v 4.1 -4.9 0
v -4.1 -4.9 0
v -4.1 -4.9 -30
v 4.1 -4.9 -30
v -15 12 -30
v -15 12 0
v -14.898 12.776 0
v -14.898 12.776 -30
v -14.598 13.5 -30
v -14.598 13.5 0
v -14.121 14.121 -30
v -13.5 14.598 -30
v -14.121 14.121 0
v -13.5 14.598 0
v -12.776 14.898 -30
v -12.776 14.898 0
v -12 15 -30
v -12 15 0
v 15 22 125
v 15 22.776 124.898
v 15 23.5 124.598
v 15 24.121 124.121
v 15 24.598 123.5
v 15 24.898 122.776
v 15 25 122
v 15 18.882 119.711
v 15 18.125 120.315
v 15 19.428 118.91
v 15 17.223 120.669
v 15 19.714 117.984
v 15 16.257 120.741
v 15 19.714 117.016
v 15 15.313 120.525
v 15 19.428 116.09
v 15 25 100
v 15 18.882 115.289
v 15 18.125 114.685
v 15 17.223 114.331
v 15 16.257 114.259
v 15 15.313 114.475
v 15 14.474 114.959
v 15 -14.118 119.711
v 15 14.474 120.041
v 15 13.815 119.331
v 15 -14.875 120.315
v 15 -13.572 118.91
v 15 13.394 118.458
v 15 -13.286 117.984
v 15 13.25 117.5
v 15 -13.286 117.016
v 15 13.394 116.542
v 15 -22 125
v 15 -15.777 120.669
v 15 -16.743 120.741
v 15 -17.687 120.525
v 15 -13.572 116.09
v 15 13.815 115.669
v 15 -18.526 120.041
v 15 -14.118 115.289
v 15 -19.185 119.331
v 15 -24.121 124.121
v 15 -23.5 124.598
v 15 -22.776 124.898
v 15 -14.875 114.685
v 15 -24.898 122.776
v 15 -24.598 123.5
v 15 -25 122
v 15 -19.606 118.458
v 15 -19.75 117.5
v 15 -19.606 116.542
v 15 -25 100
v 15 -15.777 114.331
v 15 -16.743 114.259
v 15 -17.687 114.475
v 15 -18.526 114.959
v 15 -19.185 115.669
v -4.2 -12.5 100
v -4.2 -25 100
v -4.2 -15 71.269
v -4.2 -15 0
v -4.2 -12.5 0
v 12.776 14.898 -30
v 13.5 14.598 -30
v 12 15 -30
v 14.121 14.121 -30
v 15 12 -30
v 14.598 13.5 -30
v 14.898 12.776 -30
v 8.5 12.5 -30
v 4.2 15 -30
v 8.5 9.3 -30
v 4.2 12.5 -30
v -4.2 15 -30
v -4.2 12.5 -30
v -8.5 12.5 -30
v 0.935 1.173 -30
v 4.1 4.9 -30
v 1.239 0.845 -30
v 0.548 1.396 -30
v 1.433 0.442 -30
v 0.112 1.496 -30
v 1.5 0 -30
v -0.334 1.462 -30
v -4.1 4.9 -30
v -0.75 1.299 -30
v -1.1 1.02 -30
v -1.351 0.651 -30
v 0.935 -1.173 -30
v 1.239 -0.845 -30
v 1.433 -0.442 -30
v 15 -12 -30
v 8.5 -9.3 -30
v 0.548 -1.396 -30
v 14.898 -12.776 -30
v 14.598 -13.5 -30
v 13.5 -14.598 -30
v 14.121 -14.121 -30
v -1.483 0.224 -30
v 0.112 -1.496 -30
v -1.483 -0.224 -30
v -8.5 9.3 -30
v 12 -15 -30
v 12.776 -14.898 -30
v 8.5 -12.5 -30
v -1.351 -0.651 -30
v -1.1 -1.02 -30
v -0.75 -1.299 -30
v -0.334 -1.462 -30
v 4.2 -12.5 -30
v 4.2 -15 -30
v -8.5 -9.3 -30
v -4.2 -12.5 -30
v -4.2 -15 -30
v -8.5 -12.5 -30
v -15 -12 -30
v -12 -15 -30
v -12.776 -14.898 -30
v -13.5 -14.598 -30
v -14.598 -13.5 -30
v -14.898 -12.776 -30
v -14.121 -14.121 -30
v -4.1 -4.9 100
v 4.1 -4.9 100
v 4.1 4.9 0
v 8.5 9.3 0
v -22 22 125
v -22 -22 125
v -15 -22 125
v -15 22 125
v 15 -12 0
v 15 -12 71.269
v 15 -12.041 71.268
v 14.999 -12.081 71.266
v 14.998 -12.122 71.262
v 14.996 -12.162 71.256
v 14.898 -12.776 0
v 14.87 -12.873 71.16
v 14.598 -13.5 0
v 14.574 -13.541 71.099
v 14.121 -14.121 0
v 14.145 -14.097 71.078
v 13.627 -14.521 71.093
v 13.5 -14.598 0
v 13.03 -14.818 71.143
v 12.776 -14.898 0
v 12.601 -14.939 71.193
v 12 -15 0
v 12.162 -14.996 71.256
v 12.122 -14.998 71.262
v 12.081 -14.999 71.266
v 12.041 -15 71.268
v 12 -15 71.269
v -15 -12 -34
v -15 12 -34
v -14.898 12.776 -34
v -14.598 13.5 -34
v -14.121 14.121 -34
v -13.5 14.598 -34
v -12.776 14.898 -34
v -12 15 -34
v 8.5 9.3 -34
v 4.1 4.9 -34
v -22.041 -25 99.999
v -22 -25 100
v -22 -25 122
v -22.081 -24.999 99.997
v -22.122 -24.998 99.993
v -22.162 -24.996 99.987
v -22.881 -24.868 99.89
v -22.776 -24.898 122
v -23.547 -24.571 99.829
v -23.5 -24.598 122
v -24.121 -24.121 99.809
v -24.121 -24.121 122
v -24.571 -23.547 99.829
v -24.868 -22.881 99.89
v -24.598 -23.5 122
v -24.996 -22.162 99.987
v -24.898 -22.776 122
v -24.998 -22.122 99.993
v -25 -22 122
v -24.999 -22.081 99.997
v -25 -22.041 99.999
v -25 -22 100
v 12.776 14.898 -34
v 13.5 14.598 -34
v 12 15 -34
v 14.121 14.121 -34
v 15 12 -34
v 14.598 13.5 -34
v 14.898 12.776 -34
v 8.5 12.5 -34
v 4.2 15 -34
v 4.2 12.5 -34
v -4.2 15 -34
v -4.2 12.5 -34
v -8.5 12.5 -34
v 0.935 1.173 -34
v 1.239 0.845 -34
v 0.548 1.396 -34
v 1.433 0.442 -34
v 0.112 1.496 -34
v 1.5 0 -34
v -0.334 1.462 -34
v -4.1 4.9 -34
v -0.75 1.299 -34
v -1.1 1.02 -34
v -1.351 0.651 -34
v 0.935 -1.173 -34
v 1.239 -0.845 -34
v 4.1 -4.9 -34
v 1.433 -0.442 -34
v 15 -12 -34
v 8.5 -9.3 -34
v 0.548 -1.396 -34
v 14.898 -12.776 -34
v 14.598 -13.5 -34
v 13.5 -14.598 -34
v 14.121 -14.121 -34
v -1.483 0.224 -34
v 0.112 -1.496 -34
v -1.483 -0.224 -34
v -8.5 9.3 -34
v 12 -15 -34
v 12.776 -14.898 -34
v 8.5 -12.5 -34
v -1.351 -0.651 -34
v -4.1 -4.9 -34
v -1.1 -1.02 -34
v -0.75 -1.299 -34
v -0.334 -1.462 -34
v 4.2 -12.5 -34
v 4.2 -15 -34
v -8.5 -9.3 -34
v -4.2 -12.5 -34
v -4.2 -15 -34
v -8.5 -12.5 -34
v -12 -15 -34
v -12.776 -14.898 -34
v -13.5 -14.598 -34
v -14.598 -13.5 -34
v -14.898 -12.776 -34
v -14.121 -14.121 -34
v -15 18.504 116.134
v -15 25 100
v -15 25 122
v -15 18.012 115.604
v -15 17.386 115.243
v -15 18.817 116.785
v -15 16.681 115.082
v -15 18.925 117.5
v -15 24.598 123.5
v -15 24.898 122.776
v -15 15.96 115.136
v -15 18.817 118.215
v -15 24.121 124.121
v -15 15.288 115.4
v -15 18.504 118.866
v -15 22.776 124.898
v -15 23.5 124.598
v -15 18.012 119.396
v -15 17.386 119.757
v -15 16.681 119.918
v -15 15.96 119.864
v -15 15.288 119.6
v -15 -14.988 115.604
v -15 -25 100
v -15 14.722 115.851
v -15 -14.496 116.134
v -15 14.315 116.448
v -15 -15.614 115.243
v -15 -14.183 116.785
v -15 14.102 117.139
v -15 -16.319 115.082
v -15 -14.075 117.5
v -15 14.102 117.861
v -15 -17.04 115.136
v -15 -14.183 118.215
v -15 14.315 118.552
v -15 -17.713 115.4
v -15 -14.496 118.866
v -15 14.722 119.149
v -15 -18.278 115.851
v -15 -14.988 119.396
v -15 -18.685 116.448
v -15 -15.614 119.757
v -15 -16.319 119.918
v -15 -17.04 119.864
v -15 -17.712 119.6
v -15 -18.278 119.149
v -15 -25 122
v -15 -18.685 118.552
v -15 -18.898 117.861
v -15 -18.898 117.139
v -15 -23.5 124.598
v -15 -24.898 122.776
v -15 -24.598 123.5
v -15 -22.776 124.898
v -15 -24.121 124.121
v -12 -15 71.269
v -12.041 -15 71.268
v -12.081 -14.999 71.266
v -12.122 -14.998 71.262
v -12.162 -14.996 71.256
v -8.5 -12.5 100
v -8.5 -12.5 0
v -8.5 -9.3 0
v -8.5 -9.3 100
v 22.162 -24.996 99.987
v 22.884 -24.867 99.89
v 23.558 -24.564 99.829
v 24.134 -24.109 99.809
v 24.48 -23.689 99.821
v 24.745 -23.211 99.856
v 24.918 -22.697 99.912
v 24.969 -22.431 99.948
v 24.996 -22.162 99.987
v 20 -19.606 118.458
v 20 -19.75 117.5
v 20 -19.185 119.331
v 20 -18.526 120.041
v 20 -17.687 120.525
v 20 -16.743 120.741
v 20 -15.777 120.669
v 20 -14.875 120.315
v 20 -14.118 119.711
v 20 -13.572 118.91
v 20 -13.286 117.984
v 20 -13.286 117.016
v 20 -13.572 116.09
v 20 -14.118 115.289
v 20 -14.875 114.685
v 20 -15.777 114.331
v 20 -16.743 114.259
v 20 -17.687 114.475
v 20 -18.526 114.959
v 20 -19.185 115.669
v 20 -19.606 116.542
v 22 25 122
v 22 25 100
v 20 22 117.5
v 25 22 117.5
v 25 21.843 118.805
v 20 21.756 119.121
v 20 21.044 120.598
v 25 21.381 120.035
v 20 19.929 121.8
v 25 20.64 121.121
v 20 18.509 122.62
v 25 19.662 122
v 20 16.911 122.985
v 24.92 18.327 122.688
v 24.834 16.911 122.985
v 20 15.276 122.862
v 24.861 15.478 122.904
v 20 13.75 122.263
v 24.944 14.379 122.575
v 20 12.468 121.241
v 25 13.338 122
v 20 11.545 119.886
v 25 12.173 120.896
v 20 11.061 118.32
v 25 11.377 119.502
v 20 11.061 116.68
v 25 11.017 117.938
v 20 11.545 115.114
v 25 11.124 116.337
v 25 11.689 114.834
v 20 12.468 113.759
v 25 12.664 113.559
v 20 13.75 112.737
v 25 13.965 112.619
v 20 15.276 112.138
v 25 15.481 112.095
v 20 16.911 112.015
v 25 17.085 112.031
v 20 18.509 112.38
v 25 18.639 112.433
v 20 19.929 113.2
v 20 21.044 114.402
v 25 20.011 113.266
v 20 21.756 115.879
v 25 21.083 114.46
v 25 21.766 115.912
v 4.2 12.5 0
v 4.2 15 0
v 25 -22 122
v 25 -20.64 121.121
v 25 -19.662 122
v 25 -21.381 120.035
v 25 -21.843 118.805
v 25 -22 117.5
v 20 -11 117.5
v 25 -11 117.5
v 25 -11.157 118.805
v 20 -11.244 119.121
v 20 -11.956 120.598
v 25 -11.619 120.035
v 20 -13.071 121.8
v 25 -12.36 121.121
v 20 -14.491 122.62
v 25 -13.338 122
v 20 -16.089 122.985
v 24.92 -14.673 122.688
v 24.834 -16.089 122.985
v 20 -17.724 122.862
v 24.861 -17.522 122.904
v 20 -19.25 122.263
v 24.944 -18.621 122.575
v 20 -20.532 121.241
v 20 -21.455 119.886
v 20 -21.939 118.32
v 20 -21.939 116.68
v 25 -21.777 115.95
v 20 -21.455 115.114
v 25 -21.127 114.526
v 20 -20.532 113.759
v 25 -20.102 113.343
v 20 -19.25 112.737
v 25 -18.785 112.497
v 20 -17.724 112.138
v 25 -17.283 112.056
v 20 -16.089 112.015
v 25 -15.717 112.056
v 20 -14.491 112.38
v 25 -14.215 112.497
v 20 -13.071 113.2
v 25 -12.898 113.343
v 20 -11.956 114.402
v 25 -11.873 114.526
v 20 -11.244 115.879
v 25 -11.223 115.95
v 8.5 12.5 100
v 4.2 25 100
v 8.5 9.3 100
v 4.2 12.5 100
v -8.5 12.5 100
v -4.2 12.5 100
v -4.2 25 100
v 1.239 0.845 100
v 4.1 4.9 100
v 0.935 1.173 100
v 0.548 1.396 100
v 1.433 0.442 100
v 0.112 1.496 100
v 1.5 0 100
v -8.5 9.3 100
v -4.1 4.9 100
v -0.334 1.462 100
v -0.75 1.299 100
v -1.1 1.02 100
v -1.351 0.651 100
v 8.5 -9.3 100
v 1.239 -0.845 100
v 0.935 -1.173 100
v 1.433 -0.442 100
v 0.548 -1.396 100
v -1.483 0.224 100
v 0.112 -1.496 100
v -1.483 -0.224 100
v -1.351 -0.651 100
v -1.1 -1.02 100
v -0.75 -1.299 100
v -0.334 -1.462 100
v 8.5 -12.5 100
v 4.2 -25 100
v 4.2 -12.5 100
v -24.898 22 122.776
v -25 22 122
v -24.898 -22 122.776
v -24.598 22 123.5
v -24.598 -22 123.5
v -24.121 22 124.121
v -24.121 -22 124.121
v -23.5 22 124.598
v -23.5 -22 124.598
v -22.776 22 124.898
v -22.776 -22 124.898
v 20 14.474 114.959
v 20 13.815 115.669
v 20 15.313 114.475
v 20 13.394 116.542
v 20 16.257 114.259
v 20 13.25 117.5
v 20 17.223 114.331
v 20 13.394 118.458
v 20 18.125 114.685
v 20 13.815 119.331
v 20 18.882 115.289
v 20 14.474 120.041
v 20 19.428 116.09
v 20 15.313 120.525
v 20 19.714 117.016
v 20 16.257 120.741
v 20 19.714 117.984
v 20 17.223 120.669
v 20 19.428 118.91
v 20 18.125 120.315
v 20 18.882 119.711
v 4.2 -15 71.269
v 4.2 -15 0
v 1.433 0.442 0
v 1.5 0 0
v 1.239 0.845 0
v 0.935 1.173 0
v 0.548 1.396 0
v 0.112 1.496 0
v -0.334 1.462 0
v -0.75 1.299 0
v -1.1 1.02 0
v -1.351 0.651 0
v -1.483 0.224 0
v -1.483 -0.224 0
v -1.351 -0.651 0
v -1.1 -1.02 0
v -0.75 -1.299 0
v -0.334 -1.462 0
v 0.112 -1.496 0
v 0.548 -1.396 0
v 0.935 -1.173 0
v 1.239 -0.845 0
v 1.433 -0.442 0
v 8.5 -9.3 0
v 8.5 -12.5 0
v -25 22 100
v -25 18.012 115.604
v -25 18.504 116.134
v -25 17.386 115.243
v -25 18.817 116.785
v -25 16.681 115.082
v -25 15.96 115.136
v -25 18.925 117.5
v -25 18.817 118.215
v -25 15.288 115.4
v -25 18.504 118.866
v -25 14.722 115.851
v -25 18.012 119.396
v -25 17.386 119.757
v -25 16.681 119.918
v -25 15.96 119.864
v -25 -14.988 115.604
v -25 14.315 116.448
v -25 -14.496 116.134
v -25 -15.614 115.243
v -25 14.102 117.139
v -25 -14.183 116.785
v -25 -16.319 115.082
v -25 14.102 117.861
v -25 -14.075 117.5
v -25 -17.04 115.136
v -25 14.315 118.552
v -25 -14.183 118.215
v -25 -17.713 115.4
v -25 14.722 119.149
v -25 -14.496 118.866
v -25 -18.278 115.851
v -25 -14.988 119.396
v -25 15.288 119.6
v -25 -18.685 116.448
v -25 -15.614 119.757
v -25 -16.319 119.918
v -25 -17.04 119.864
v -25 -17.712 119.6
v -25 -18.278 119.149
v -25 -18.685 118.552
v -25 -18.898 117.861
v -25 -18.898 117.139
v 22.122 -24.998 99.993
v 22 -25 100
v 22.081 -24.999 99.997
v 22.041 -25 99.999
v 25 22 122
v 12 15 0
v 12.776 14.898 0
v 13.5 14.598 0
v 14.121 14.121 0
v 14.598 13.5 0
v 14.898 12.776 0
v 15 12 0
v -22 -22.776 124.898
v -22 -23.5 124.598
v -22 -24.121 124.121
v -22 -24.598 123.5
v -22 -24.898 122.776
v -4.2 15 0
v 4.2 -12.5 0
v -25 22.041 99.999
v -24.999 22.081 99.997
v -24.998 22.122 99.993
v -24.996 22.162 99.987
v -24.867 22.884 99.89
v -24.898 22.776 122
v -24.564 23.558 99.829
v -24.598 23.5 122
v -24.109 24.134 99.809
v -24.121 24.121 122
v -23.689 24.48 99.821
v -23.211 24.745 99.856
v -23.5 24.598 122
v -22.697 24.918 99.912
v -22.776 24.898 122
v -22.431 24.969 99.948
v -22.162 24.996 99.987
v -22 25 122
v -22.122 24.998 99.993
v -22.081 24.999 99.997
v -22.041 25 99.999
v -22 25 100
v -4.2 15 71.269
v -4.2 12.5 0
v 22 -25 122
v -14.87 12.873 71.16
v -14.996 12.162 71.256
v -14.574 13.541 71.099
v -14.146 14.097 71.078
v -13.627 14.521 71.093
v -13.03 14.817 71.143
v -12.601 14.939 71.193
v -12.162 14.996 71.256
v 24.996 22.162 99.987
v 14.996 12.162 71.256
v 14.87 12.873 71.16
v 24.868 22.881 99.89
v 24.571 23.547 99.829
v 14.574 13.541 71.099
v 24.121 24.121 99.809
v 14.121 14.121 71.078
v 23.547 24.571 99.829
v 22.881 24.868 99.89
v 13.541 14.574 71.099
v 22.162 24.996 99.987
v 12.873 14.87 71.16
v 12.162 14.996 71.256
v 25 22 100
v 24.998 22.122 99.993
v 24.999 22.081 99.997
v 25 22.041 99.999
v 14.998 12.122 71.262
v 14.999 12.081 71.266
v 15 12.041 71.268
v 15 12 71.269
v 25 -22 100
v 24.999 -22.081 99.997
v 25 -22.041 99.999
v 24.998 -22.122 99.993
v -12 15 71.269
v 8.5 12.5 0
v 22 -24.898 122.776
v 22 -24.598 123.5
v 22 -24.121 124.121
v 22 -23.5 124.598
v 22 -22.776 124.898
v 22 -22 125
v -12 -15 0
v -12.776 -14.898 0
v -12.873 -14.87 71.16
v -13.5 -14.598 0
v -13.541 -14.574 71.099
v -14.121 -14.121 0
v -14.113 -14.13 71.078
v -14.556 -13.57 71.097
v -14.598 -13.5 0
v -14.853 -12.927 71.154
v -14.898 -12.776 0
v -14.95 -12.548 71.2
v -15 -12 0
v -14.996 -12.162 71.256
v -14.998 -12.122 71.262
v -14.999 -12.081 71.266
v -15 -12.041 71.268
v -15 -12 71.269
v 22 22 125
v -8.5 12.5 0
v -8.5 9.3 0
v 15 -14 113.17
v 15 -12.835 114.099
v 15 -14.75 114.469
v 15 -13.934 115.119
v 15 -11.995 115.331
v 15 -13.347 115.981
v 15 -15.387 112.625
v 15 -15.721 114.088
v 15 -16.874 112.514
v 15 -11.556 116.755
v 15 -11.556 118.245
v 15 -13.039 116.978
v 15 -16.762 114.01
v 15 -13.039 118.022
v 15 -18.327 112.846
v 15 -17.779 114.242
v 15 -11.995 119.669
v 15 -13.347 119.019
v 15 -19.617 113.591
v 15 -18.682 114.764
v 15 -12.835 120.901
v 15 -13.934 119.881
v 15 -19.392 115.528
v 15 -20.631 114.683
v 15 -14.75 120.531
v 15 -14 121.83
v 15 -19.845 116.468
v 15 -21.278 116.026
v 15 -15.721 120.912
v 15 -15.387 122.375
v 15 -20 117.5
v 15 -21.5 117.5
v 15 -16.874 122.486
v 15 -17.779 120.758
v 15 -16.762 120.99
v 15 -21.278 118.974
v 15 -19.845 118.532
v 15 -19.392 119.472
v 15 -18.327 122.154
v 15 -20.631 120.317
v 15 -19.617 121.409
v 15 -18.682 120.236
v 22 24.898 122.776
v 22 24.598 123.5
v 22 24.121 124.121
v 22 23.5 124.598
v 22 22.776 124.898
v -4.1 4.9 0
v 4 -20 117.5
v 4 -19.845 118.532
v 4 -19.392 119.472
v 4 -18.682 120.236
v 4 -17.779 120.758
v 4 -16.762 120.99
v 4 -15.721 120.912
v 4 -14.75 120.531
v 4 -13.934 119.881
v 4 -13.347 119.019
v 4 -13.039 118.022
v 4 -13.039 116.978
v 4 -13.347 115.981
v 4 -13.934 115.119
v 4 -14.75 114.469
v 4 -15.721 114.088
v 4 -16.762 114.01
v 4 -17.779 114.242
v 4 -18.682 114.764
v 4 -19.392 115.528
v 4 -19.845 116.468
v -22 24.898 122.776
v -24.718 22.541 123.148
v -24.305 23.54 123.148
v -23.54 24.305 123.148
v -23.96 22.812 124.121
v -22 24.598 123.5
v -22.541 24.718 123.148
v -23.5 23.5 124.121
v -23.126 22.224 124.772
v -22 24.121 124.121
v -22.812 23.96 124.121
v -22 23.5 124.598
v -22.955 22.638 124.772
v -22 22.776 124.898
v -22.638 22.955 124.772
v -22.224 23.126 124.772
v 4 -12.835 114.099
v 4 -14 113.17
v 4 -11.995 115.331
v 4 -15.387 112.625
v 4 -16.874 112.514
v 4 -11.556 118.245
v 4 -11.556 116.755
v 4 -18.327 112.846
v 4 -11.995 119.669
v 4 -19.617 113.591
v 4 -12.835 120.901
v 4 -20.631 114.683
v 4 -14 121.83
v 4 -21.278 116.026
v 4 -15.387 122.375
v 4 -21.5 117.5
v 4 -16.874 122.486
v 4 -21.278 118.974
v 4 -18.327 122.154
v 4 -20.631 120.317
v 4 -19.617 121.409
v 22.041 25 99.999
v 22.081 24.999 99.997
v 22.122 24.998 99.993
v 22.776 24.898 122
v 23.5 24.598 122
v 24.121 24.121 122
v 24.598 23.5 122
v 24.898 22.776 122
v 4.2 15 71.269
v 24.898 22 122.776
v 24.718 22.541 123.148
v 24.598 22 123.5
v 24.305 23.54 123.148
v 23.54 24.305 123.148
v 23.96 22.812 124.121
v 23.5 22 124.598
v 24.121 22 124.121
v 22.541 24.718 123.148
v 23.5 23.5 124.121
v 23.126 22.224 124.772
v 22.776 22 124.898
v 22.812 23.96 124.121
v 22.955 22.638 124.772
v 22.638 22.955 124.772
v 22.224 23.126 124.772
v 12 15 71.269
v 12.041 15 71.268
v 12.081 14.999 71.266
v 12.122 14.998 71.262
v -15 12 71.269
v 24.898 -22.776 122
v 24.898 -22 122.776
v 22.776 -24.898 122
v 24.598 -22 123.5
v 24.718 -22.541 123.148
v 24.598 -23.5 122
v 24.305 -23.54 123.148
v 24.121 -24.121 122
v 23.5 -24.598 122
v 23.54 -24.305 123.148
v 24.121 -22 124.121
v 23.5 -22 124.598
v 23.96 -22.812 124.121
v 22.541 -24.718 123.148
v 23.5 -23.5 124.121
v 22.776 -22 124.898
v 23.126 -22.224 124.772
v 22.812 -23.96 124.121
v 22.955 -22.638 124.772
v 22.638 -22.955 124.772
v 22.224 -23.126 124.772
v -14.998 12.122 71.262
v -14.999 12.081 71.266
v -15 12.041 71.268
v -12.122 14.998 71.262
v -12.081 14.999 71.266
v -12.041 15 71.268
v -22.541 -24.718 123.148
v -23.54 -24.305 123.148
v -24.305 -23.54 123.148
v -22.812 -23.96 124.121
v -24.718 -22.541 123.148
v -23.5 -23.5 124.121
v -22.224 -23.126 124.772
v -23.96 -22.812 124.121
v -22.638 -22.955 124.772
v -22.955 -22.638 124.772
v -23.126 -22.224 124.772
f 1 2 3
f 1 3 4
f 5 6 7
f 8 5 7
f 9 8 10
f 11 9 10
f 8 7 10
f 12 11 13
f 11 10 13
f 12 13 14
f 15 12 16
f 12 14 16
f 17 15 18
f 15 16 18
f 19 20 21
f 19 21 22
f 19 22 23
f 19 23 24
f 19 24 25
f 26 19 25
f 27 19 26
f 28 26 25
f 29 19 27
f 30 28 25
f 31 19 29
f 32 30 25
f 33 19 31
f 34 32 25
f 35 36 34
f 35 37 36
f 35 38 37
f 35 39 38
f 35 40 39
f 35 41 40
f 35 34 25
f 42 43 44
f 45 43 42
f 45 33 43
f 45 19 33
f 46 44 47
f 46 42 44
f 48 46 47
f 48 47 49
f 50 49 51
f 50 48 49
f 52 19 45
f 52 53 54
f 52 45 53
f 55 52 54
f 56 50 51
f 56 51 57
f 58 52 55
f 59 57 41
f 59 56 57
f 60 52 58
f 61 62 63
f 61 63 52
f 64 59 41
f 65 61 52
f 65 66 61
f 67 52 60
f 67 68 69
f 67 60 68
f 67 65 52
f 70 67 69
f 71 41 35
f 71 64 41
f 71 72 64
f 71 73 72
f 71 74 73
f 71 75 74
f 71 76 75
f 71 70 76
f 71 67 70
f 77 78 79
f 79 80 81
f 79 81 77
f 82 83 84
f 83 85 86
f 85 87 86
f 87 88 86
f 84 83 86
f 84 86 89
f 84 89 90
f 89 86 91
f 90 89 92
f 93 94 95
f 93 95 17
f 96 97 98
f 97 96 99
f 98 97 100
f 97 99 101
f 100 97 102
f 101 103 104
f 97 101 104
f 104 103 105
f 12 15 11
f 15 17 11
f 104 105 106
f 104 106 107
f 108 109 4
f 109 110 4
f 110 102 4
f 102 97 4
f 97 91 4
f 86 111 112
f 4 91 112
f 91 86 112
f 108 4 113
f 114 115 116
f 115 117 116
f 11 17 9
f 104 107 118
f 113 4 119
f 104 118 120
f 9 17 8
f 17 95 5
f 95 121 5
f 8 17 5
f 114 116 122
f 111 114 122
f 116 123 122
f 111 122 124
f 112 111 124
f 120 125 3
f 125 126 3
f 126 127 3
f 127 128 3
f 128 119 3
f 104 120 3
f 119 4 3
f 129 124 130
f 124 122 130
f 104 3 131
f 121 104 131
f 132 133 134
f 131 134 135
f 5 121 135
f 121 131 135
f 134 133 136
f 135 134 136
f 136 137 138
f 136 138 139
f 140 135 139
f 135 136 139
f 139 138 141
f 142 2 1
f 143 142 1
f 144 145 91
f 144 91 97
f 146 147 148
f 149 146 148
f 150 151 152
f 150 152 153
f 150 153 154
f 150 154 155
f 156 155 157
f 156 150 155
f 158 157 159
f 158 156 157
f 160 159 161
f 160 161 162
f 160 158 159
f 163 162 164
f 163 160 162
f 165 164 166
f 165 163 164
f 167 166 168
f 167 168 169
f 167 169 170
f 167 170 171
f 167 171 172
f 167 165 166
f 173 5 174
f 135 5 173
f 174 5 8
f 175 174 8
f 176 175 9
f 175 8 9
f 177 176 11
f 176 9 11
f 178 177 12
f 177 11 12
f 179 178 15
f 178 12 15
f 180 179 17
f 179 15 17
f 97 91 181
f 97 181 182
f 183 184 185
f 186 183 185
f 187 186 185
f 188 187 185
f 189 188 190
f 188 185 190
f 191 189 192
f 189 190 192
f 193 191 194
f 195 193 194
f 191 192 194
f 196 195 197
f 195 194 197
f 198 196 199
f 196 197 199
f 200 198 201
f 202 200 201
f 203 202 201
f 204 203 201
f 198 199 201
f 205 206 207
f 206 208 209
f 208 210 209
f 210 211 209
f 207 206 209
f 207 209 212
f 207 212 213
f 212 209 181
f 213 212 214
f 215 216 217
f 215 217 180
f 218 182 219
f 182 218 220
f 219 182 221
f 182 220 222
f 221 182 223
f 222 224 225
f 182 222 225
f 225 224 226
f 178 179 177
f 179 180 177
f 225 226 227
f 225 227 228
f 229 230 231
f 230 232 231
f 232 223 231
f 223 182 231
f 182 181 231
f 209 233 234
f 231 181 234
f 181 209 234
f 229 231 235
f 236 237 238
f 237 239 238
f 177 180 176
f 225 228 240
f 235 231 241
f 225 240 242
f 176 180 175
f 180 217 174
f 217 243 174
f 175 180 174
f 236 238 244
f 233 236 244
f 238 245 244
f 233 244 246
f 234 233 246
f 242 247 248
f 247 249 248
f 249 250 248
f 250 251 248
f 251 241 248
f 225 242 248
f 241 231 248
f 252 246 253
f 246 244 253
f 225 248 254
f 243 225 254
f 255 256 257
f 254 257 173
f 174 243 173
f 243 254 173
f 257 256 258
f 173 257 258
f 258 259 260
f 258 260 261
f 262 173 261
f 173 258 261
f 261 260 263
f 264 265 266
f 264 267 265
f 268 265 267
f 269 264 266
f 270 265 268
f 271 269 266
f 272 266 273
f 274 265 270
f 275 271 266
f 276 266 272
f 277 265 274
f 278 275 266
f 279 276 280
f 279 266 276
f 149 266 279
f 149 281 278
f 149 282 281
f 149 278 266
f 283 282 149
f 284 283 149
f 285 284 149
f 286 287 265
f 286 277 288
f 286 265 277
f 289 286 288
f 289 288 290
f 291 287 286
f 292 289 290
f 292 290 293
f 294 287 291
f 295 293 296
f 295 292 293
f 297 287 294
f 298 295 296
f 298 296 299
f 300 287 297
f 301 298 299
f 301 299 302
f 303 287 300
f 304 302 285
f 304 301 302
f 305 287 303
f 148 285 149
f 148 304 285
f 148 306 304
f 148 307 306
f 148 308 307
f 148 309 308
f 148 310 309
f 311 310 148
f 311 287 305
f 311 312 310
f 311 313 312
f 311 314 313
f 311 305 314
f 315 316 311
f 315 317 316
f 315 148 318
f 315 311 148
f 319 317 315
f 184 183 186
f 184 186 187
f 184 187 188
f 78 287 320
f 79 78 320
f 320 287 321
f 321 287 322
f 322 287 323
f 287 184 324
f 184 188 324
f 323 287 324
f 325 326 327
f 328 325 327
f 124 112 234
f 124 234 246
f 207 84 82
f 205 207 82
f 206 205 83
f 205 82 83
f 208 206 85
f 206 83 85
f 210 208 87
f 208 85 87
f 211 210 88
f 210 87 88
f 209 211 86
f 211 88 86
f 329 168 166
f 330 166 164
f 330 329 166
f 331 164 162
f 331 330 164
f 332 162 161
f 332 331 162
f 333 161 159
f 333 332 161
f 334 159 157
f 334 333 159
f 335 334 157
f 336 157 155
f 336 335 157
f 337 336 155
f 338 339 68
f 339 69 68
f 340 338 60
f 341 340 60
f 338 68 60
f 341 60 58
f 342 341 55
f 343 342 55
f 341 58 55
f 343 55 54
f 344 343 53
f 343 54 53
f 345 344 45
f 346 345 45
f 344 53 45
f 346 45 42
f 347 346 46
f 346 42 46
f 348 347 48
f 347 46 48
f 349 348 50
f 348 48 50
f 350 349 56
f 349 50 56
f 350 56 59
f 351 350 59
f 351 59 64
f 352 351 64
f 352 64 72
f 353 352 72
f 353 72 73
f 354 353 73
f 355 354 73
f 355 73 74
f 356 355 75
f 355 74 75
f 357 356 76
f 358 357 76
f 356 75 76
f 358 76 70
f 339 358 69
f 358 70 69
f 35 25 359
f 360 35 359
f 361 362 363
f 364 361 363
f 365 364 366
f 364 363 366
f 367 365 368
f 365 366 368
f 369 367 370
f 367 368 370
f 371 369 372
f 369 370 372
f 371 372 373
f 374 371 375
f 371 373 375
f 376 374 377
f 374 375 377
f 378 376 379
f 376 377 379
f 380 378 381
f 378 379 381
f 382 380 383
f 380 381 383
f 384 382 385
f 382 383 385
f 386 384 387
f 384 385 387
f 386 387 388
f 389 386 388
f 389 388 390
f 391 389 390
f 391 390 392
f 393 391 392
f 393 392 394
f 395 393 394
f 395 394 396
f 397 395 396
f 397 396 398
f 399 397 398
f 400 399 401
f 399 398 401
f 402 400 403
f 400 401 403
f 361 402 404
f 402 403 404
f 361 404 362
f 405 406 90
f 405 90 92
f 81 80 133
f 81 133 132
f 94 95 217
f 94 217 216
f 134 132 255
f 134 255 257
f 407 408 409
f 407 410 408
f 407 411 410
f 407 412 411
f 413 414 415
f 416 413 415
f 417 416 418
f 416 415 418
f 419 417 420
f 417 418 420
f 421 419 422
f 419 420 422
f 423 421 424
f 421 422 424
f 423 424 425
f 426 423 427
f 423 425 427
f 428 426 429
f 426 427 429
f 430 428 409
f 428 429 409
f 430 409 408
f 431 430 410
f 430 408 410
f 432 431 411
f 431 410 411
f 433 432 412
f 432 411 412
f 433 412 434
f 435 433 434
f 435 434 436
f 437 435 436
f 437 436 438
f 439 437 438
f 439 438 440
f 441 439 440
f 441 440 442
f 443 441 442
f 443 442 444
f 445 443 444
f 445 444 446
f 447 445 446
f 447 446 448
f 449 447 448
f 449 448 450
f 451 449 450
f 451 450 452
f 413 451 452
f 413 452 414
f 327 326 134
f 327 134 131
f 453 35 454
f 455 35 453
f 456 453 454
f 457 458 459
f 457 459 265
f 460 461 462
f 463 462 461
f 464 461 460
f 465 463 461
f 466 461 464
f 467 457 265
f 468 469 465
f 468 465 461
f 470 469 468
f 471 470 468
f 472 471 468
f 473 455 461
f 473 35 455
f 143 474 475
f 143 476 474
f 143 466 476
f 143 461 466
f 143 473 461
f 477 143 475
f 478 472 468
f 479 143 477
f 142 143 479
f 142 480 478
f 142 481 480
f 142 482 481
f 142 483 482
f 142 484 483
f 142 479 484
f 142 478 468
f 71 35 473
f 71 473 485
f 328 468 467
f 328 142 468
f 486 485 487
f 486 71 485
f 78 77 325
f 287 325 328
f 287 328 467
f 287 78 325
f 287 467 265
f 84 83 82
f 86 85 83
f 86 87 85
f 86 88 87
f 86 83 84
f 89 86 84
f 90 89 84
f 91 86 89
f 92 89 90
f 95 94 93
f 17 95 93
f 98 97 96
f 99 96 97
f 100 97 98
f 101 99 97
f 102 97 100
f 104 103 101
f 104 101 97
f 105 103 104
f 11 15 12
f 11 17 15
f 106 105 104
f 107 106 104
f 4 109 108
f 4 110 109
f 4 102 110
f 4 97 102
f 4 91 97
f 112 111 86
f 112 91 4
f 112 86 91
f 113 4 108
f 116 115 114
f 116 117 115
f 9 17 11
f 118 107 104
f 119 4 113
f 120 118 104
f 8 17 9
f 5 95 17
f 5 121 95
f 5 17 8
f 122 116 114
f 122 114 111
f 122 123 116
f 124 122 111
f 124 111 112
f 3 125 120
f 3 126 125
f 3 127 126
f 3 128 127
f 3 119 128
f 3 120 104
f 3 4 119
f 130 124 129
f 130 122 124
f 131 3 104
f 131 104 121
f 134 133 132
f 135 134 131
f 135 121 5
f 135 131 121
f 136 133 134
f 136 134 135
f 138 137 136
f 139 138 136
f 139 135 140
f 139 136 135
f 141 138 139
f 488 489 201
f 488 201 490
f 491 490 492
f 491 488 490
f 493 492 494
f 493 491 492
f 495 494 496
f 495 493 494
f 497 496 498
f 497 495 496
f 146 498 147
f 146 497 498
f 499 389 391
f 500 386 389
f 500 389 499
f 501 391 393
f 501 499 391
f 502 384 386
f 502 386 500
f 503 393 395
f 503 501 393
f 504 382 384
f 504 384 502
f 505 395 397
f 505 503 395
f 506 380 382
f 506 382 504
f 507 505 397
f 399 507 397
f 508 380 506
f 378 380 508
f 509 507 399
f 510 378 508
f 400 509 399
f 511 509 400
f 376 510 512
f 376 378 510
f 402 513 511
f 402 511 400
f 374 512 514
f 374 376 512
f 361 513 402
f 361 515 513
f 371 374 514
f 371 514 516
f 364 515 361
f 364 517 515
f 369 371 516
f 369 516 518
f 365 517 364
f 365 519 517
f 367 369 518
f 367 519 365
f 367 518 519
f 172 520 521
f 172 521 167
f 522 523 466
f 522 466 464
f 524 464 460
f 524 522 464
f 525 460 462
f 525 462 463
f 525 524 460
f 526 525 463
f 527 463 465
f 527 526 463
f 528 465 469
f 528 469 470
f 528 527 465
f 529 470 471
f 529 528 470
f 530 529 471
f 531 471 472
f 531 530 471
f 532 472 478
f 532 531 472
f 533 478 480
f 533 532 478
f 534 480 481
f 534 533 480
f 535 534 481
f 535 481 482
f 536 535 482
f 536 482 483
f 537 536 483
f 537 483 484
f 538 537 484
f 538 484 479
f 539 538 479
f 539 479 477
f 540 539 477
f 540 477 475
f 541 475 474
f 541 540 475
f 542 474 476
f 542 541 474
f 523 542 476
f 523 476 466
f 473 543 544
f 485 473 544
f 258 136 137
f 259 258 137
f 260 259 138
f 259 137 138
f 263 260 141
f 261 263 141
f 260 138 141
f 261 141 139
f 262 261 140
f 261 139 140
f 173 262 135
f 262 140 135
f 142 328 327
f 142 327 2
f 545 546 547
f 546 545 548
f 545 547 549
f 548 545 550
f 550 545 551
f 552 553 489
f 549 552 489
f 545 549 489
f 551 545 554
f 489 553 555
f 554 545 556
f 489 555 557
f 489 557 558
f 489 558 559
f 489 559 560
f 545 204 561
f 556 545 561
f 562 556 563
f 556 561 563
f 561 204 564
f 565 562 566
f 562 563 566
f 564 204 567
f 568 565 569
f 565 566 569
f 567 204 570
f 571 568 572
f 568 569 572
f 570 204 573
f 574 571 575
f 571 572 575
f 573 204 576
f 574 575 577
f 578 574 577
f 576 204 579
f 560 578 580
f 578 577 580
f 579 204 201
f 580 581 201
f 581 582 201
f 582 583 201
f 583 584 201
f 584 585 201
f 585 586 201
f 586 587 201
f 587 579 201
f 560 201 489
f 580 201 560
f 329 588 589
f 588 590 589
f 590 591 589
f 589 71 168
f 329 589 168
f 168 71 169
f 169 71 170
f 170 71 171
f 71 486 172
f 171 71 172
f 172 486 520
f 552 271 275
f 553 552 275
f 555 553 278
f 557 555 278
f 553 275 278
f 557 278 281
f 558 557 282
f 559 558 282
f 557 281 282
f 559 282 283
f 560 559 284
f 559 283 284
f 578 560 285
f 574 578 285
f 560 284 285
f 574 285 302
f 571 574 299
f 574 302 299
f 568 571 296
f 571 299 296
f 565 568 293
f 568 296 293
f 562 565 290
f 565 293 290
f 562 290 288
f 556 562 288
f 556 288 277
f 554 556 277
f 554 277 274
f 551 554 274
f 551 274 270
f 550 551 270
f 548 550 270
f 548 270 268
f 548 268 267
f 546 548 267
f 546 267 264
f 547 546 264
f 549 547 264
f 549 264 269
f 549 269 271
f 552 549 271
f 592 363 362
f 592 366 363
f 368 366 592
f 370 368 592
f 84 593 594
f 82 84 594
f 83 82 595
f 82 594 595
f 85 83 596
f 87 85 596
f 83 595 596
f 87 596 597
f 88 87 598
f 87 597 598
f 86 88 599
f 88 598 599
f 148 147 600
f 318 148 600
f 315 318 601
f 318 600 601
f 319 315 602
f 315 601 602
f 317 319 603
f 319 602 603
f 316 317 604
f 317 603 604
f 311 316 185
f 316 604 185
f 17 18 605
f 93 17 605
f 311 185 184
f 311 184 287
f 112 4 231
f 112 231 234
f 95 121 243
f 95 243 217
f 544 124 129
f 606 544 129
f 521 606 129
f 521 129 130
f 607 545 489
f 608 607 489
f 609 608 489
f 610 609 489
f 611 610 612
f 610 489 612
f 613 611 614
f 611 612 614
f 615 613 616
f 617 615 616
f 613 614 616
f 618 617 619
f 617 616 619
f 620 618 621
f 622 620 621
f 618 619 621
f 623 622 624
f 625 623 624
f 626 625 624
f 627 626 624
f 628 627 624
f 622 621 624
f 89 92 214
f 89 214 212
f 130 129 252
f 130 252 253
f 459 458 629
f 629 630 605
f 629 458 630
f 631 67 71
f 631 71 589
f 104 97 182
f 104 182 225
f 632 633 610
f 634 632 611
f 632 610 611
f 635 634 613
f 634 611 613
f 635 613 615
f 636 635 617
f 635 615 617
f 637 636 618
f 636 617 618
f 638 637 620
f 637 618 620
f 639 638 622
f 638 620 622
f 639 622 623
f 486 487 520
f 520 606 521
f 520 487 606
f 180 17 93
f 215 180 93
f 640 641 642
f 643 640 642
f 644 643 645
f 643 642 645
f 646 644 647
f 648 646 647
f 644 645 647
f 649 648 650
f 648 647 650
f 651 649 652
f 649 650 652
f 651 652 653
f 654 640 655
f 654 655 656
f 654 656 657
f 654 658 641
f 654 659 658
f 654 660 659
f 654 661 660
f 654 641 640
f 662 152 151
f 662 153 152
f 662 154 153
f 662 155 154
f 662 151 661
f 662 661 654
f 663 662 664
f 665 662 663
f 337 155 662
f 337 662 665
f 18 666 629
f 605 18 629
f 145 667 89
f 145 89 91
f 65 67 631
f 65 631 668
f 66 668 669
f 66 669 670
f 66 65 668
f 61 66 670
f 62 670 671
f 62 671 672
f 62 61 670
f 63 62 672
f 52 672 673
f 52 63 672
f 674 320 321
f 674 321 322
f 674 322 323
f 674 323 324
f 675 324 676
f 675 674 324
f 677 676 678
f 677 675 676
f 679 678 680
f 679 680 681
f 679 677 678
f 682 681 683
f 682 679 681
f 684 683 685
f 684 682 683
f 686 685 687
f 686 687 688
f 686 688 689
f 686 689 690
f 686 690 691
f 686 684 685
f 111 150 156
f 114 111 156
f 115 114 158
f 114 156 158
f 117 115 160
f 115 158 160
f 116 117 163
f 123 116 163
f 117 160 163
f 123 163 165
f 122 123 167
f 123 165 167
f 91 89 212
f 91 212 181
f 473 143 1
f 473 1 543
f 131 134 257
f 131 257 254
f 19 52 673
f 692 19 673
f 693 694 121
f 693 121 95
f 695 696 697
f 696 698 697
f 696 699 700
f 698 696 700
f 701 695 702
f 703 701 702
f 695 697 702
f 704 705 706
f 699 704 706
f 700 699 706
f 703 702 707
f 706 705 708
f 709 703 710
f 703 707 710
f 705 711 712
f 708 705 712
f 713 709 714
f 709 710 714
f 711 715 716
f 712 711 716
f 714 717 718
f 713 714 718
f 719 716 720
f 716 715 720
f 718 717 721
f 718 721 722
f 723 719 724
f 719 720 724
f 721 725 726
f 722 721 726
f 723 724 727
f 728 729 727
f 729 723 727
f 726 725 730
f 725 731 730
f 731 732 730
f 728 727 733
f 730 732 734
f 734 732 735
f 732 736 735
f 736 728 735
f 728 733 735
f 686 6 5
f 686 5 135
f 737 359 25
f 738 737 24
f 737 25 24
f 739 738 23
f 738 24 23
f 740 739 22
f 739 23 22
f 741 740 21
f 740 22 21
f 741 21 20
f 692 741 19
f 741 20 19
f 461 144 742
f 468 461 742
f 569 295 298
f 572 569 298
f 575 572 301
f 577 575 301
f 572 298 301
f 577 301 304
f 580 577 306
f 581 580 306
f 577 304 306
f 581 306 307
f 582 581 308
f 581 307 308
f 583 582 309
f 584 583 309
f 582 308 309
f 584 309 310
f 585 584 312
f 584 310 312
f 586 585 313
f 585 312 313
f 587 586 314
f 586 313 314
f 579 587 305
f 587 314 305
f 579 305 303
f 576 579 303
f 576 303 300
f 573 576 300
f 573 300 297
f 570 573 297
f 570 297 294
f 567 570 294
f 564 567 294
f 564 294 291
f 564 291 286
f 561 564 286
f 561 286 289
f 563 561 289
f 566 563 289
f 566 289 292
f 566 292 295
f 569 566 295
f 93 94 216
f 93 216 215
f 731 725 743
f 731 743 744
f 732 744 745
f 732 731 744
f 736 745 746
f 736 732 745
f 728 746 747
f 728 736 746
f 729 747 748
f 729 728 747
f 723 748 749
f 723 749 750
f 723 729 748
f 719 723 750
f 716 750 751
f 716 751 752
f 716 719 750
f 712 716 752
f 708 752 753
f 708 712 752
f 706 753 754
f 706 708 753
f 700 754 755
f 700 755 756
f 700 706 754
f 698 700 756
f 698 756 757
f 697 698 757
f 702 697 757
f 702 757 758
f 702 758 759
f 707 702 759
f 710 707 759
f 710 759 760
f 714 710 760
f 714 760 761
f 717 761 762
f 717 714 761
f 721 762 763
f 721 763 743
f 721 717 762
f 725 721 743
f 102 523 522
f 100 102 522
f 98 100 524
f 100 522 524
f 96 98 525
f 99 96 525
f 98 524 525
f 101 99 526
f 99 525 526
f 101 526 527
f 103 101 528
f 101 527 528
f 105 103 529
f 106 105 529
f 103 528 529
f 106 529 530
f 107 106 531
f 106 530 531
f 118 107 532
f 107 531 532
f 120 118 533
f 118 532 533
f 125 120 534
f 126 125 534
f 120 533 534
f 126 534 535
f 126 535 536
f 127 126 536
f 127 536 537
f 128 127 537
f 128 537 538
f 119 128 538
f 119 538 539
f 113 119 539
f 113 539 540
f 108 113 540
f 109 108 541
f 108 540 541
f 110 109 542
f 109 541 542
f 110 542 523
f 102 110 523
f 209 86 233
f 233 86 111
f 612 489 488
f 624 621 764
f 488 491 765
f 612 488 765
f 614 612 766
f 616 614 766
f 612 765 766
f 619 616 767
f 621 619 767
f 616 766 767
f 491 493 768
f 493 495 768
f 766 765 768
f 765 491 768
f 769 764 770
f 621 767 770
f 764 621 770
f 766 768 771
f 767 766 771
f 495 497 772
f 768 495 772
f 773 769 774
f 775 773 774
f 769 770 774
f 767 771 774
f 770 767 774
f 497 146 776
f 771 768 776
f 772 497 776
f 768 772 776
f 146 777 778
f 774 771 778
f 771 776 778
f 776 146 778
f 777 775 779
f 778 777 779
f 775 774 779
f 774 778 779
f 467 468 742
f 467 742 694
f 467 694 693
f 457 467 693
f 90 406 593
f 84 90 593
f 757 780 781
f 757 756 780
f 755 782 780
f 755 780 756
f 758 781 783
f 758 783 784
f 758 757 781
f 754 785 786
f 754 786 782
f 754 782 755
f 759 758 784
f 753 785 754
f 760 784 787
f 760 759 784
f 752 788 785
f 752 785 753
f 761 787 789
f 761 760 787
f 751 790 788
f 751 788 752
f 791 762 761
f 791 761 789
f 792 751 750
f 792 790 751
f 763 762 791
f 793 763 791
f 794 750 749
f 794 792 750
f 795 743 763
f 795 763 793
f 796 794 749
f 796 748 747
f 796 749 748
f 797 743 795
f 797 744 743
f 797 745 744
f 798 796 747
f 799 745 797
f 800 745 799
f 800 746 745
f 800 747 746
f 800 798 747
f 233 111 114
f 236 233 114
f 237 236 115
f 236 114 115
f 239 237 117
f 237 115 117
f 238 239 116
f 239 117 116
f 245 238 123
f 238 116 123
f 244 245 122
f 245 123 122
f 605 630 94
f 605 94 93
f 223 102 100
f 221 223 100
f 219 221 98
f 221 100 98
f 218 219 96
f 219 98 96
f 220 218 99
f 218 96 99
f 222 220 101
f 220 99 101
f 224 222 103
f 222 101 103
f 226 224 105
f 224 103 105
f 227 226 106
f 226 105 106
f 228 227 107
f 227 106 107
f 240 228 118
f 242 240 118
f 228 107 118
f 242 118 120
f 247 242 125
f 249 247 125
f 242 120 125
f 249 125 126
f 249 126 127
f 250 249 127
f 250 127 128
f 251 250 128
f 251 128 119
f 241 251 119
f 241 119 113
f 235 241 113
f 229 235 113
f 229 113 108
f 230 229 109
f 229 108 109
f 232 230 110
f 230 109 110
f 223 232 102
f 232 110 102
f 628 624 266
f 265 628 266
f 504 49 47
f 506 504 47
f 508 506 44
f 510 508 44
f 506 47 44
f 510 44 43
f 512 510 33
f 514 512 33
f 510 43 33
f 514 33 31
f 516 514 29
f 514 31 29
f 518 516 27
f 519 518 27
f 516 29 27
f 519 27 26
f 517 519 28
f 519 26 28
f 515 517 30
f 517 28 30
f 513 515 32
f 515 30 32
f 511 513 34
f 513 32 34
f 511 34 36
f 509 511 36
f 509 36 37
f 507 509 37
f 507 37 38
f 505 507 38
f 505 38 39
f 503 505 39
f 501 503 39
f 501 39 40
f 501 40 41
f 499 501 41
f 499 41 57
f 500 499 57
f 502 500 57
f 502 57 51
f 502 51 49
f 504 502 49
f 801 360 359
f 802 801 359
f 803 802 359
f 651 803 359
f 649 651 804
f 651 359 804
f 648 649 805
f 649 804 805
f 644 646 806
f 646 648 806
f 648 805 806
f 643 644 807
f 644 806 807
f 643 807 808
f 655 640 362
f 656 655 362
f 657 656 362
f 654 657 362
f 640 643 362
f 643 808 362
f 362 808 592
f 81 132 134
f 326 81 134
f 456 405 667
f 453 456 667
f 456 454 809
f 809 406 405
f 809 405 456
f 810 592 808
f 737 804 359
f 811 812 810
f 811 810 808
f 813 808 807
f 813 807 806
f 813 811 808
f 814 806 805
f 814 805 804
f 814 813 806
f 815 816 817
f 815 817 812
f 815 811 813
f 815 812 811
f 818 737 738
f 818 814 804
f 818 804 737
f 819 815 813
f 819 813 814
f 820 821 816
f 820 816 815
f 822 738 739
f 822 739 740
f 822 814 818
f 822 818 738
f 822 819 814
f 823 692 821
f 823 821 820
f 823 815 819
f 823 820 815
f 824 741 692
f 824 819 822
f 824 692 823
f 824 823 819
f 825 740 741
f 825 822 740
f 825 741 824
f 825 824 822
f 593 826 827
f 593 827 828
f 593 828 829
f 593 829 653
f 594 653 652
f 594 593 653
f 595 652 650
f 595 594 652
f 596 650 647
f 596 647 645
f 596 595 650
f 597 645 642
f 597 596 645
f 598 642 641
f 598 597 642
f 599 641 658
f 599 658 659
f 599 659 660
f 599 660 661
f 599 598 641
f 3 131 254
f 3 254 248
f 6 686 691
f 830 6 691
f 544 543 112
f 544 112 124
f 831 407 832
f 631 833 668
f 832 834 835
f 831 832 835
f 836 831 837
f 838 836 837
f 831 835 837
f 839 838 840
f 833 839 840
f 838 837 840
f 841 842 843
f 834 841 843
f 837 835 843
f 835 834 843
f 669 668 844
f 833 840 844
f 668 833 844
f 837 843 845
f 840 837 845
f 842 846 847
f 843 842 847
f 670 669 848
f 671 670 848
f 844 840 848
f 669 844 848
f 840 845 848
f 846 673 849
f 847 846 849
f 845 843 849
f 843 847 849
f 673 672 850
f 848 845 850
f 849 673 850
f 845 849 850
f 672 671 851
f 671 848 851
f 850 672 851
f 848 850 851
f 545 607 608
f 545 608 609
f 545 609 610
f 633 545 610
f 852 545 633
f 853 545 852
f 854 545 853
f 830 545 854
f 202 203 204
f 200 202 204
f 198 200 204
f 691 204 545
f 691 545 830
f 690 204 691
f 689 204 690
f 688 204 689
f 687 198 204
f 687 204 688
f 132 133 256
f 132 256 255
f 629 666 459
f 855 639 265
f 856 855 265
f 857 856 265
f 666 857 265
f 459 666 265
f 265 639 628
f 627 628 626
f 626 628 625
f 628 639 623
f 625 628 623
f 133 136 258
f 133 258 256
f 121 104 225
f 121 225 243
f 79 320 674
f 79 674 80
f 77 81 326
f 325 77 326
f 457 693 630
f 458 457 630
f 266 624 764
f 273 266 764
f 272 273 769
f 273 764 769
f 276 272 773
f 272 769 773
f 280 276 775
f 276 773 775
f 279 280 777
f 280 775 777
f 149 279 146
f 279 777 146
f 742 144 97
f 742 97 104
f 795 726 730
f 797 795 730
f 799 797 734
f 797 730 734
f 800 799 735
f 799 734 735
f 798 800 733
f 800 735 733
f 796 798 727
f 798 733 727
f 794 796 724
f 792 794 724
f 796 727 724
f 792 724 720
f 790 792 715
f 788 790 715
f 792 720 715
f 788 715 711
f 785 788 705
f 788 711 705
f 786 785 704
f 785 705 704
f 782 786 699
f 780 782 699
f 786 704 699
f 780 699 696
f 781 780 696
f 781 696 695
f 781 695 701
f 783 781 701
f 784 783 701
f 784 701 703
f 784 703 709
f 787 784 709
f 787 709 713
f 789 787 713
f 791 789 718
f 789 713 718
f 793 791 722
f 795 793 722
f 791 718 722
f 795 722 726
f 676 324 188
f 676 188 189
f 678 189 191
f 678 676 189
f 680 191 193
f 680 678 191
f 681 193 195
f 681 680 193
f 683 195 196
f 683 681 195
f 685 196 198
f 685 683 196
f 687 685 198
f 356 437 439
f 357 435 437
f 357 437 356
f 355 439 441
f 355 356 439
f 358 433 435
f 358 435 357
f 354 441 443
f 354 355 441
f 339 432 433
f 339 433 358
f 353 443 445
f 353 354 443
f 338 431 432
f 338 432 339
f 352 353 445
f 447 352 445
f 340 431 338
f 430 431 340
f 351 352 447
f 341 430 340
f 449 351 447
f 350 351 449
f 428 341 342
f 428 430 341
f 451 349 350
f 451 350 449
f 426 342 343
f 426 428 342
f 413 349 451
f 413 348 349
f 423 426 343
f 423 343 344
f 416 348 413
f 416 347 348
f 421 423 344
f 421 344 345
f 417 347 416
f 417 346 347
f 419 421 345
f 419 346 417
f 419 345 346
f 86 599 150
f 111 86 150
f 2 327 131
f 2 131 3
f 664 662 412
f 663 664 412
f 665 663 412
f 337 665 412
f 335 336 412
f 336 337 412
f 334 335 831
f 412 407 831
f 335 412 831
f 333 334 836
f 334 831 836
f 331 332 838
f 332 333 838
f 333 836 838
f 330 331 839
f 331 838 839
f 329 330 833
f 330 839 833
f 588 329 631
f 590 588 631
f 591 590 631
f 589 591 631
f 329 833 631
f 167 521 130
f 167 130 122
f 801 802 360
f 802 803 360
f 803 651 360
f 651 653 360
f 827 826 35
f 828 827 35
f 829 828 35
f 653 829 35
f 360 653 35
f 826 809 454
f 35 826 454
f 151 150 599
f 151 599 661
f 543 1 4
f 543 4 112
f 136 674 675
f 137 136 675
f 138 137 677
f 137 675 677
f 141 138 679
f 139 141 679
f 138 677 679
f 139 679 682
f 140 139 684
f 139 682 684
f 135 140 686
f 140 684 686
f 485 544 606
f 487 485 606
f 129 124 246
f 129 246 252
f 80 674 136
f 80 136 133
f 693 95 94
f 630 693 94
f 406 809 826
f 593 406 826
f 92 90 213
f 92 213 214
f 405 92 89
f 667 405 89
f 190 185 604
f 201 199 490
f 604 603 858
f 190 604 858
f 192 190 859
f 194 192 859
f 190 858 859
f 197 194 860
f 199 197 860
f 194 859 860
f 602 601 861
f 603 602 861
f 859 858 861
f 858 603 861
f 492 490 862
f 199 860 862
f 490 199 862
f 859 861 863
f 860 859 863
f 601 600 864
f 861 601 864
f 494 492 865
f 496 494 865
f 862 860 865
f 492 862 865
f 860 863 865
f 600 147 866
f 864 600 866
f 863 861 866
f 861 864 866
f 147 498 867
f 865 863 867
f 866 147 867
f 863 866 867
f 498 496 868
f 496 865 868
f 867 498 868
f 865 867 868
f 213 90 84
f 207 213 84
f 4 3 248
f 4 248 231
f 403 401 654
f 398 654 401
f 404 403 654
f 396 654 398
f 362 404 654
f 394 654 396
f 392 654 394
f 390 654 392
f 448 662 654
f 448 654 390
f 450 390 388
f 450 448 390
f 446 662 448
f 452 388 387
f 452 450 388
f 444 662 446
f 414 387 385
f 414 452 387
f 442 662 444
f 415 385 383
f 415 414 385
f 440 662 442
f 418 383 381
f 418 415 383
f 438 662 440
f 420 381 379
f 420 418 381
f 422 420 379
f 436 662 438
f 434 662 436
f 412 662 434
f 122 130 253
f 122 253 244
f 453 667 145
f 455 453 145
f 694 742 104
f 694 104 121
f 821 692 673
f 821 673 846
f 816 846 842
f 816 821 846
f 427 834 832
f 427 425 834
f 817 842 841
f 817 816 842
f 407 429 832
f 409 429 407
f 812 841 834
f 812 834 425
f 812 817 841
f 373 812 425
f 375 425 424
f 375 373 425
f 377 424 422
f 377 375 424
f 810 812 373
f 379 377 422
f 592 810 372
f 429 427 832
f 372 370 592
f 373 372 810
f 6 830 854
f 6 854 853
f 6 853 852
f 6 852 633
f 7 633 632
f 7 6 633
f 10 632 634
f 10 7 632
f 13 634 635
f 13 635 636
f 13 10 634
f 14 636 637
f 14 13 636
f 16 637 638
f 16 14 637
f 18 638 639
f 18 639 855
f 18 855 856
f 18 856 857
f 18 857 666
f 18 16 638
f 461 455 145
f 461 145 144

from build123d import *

# Parameters (mm, degrees)
F0_R          = 1.5
F1_DEPTH      = 100
F2_W          = 10
F2_H          = 25
F3_DEPTH      = 30
F4_DEPTH      = 10
F5_DEPTH      = 10
F7_DEPTH      = 132
F8_DEPTH      = 110
F9_F1_R       = 3
F9_F2_R       = 3
F9_F3_R       = 3
F9_F4_R       = 3
F9_F5_R       = 3
F9_F6_R       = 3
F9_F7_R       = 3
F9_F8_R       = 3
F9_F9_R       = 3
F9_F10_R      = 3
F9_F11_R      = 3
F9_F12_R      = 3
F10_R         = 3.25
F11_DEPTH     = 15
F12_R         = 2.425
F13_DEPTH     = 80
F14_R         = 5.5
F15_DEPTH     = 5
F17_DEPTH     = 124
F18_W         = 8.4
F18_H         = 10
F19_DEPTH     = 30
F20_DEPTH     = 30
F21_T1_DEPTH  = 14.5
F21_T3_DEPTH  = 14.5
F21_T5_DEPTH  = 44
F21_T8_ANGLE  = 90
F21_T10_ANGLE = 90
F21_T12_ANGLE = 90
F21_T14_ANGLE = 90
F22_R         = 5
F22_R_2       = 3.5
F23_DEPTH     = 11
F24_DEPTH     = 4


# Not quite as in the source:
# - a fillet or chamfer that OpenCascade refuses, or shapes differently, is made with other operations: its cross-section is extruded or revolved along the edge and cut away or added


with BuildPart() as f1:
    # F0 (on Top) → F1 (new body)
    with BuildSketch(Plane.XY):
        Polygon((-12, -15), (12, -15), (15, -15), (15, -12), (15, 12), (15, 15), (12, 15), (-12, 15), (-15, 15), (-15, 12), (-15, -12), (-15, -15), align=None)
        Circle(F0_R, mode=Mode.SUBTRACT)
    extrude(amount=F1_DEPTH)

    # F2 (on face) → F3 (join, through all)
    with BuildSketch(Plane.XZ.offset(15)):
        with Locations((20, 112.5)):
            Rectangle(F2_W, F2_H)
        Polygon((25, 100), (15, 100), (15, 71.2687671185), align=None)
        Polygon((-15, 71.2687671185), (-15, 100), (-25, 100), align=None)
        with Locations((-20, 112.5)):
            Rectangle(F2_W, F2_H)
    extrude(amount=-F3_DEPTH)

    # F4 (add): faces of the model
    f4_faces = [f1.faces().sort_by_distance(p)[0] for p in [
        (0, -15, 61.3177895676),
        (0, -15, 61.3177895676),
    ]]
    extrude(f4_faces, amount=F4_DEPTH)

    # F5 (add): faces of the model
    f5_faces = [f1.faces().sort_by_distance(p)[0] for p in [
        (0, 15, 61.3177895676),
        (0, 15, 61.3177895676),
    ]]
    extrude(f5_faces, amount=F5_DEPTH)

    # F6 (on face) → F7 (cut)
    with BuildSketch(Plane(origin=(-25, 0, 0), x_dir=(0, -1, 0), z_dir=(-1, 0, 0))):
        Polygon((25, 100), (15, 71.2687671185), (25, 71.2687671185), align=None)
        Polygon((-25, 71.2687671185), (-15, 71.2687671185), (-25, 100), align=None)
    extrude(amount=-F7_DEPTH, mode=Mode.SUBTRACT)

    # F8 (cut): faces of the model
    f8_faces = [f1.faces().sort_by_distance(p)[0] for p in [
        (0, -20, 71.2687671185),
        (0, 20, 71.2687671185),
    ]]
    extrude(f8_faces, amount=-F8_DEPTH, mode=Mode.SUBTRACT)

    # F9: fillet of radius 3 on 12 edges, made by hand

    # F9_f1
    f9_f1_edges = [f1.edges().sort_by_distance(p)[0] for p in [
        (25, 25, 112.5),
    ]]
    fillet(f9_f1_edges, radius=F9_F1_R)

    # F9_f2
    f9_f2_edges = [f1.edges().sort_by_distance(p)[0] for p in [
        (25, -25, 112.5),
    ]]
    fillet(f9_f2_edges, radius=F9_F2_R)

    # F9_f3
    f9_f3_edges = [f1.edges().sort_by_distance(p)[0] for p in [
        (-25, -25, 112.5),
    ]]
    fillet(f9_f3_edges, radius=F9_F3_R)

    # F9_f4
    f9_f4_edges = [f1.edges().sort_by_distance(p)[0] for p in [
        (-25, 25, 112.5),
    ]]
    fillet(f9_f4_edges, radius=F9_F4_R)

    # F9_f5
    f9_f5_edges = [f1.edges().sort_by_distance(p)[0] for p in [
        (19.5606601718, -19.5606601718, 84.3721060674),
    ]]
    fillet(f9_f5_edges, radius=F9_F5_R)

    # F9_f6
    f9_f6_edges = [f1.edges().sort_by_distance(p)[0] for p in [
        (19.5606601718, 19.5606601718, 84.3721060674),
    ]]
    fillet(f9_f6_edges, radius=F9_F6_R)

    # F9_f7
    f9_f7_edges = [f1.edges().sort_by_distance(p)[0] for p in [
        (-19.5606601718, -19.5606601718, 84.3721060674),
    ]]
    fillet(f9_f7_edges, radius=F9_F7_R)

    # F9_f8
    f9_f8_edges = [f1.edges().sort_by_distance(p)[0] for p in [
        (-19.5606601718, 19.5606601718, 84.3721060674),
    ]]
    fillet(f9_f8_edges, radius=F9_F8_R)

    # F9_f9
    f9_f9_edges = [f1.edges().sort_by_distance(p)[0] for p in [
        (15, 15, 36.8010775644),
    ]]
    fillet(f9_f9_edges, radius=F9_F9_R)

    # F9_f10
    f9_f10_edges = [f1.edges().sort_by_distance(p)[0] for p in [
        (15, -15, 36.8010775644),
    ]]
    fillet(f9_f10_edges, radius=F9_F10_R)

    # F9_f11
    f9_f11_edges = [f1.edges().sort_by_distance(p)[0] for p in [
        (-15, -15, 36.8010775644),
    ]]
    fillet(f9_f11_edges, radius=F9_F11_R)

    # F9_f12
    f9_f12_edges = [f1.edges().sort_by_distance(p)[0] for p in [
        (-15, 15, 36.8010775644),
    ]]
    fillet(f9_f12_edges, radius=F9_F12_R)

    # F10 (on face) → F11 (cut, symmetric)
    with BuildSketch(Plane(origin=(15, 0, 0), x_dir=(0, -1, 0), z_dir=(-1, 0, 0))):
        with Locations((-16.5, 117.5)):
            Circle(F10_R)
        with Locations((16.5, 117.5)):
            Circle(F10_R)
    extrude(amount=F11_DEPTH, both=True, mode=Mode.SUBTRACT)

    # F12 (on face) → F13 (cut)
    with BuildSketch(Plane.YZ.offset(25)):
        with Locations((16.5, 117.5)):
            Circle(F12_R)
        with Locations((-16.5, 117.5)):
            Circle(F12_R)
    extrude(amount=-F13_DEPTH, mode=Mode.SUBTRACT)

    # F14 (on face) → F15 (cut)
    with BuildSketch(Plane.YZ.offset(25)):
        with Locations((-16.5, 117.5)):
            Circle(F14_R)
        with Locations((16.5, 117.5)):
            Circle(F14_R)
    extrude(amount=-F15_DEPTH, mode=Mode.SUBTRACT)

    # F16 (on face) → F17 (cut)
    with BuildSketch(Plane(origin=(0, 0, 0), x_dir=(1, 0, 0), z_dir=(0, 0, -1))):
        Polygon((4.2, 15), (0, 15), (-4.2, 15), (-4.2, 12.5), (-8.5, 12.5), (-8.5, 9.3), (-4.1, 4.9), (0, 4.9), (4.1, 4.9), (8.5, 9.3), (8.5, 12.5), (4.2, 12.5), align=None)
        Polygon((-4.2, -12.5), (-4.2, -15), (0, -15), (4.2, -15), (4.2, -12.5), (8.5, -12.5), (8.5, -9.3), (4.1, -4.9), (0, -4.9), (-4.1, -4.9), (-8.5, -9.3), (-8.5, -12.5), align=None)
    extrude(amount=-F17_DEPTH, mode=Mode.SUBTRACT)

    # F18 (on face) → F19 (cut)
    with BuildSketch(Plane.XY.offset(100)):
        with Locations((0, 20)):
            Rectangle(F18_W, F18_H)
        with Locations((0, -20)):
            Rectangle(F18_W, F18_H)
    extrude(amount=-F19_DEPTH, mode=Mode.SUBTRACT)

    # F20 (add): a face of the model
    f20_faces = [f1.faces().sort_by_distance(p)[0] for p in [
        (-13.8213203436, 13.8213203436, 0),
    ]]
    extrude(f20_faces, amount=F20_DEPTH)

    # F21: fillet of radius 3 on 10 edges, made by hand

    # F21_s2 → F21_t1 (cut)
    with BuildSketch(Plane.YZ.offset(-22)):
        with BuildLine():
            ThreePointArc((-22, 125), (-24.1213203436, 124.1213203436), (-25, 122))
            Line((-25, 122), (-25, 125))
            Line((-25, 125), (-22, 125))
        make_face()
        with BuildLine():
            ThreePointArc((25, 122), (24.1213203436, 124.1213203436), (22, 125))
            Line((22, 125), (25, 125))
            Line((25, 125), (25, 122))
        make_face()
    extrude(amount=F21_T1_DEPTH, mode=Mode.SUBTRACT)

    # F21_s4 → F21_t3 (cut)
    with BuildSketch(Plane.YZ.offset(7.5)):
        with BuildLine():
            ThreePointArc((-25, 122), (-24.1213203436, 124.1213203436), (-22, 125))
            Line((-22, 125), (-25, 125))
            Line((-25, 125), (-25, 122))
        make_face()
        with BuildLine():
            ThreePointArc((25, 122), (24.1213203436, 124.1213203436), (22, 125))
            Line((22, 125), (25, 125))
            Line((25, 125), (25, 122))
        make_face()
    extrude(amount=F21_T3_DEPTH, mode=Mode.SUBTRACT)

    # F21_s6 → F21_t5 (cut)
    with BuildSketch(Plane.XZ.offset(-22)):
        with BuildLine():
            ThreePointArc((-25, 122), (-24.1213203436, 124.1213203436), (-22, 125))
            Line((-22, 125), (-25, 125))
            Line((-25, 125), (-25, 122))
        make_face()
        with BuildLine():
            ThreePointArc((22, 125), (24.1213203436, 124.1213203436), (25, 122))
            Line((25, 122), (25, 125))
            Line((25, 125), (22, 125))
        make_face()
    extrude(amount=F21_T5_DEPTH, mode=Mode.SUBTRACT)

    # F21_s7 → F21_t8 (revolve, cut)
    with BuildSketch(Plane.YZ.offset(-22)):
        with BuildLine():
            ThreePointArc((-25, 122), (-24.1213203436, 124.1213203436), (-22, 125))
            Line((-22, 125), (-25, 125))
            Line((-25, 125), (-25, 122))
        make_face()
    revolve(axis=Axis((-22, -22, 125), (0, 0, -1)), revolution_arc=F21_T8_ANGLE, mode=Mode.SUBTRACT)

    # F21_s9 → F21_t10 (revolve, cut)
    with BuildSketch(Plane.XZ.offset(-22)):
        with BuildLine():
            ThreePointArc((-25, 122), (-24.1213203436, 124.1213203436), (-22, 125))
            Line((-22, 125), (-25, 125))
            Line((-25, 125), (-25, 122))
        make_face()
    revolve(axis=Axis((-22, 22, 125), (0, 0, -1)), revolution_arc=F21_T10_ANGLE, mode=Mode.SUBTRACT)

    # F21_s11 → F21_t12 (revolve, cut)
    with BuildSketch(Plane.XZ.offset(22)):
        with BuildLine():
            ThreePointArc((25, 122), (24.1213203436, 124.1213203436), (22, 125))
            Line((22, 125), (25, 125))
            Line((25, 125), (25, 122))
        make_face()
    revolve(axis=Axis((22, -22, 125), (0, 0, -1)), revolution_arc=F21_T12_ANGLE, mode=Mode.SUBTRACT)

    # F21_s13 → F21_t14 (revolve, cut)
    with BuildSketch(Plane.XZ.offset(-22)):
        with BuildLine():
            ThreePointArc((25, 122), (24.1213203436, 124.1213203436), (22, 125))
            Line((22, 125), (25, 125))
            Line((25, 125), (25, 122))
        make_face()
    revolve(axis=Axis((22, 22, 125), (0, 0, 1)), revolution_arc=F21_T14_ANGLE, mode=Mode.SUBTRACT)


with BuildPart() as f23:
    # F22 (on face) → F23 (new body)
    with BuildSketch(Plane(origin=(15, 0, 0), x_dir=(0, -1, 0), z_dir=(-1, 0, 0))):
        with Locations((16.5, 117.5)):
            Circle(F22_R)
        with Locations((16.5, 117.5)):
            Circle(F22_R_2, mode=Mode.SUBTRACT)
    extrude(amount=F23_DEPTH)


with BuildPart() as f24:
    # F24 (new): a face of the model
    f24_faces = [f1.part.faces().sort_by_distance(p)[0] for p in [
        (-13.8213203436, 13.8213203436, -30),
    ]]
    extrude(f24_faces, amount=F24_DEPTH)


solid = Compound([f1.part, f23.part, f24.part])
